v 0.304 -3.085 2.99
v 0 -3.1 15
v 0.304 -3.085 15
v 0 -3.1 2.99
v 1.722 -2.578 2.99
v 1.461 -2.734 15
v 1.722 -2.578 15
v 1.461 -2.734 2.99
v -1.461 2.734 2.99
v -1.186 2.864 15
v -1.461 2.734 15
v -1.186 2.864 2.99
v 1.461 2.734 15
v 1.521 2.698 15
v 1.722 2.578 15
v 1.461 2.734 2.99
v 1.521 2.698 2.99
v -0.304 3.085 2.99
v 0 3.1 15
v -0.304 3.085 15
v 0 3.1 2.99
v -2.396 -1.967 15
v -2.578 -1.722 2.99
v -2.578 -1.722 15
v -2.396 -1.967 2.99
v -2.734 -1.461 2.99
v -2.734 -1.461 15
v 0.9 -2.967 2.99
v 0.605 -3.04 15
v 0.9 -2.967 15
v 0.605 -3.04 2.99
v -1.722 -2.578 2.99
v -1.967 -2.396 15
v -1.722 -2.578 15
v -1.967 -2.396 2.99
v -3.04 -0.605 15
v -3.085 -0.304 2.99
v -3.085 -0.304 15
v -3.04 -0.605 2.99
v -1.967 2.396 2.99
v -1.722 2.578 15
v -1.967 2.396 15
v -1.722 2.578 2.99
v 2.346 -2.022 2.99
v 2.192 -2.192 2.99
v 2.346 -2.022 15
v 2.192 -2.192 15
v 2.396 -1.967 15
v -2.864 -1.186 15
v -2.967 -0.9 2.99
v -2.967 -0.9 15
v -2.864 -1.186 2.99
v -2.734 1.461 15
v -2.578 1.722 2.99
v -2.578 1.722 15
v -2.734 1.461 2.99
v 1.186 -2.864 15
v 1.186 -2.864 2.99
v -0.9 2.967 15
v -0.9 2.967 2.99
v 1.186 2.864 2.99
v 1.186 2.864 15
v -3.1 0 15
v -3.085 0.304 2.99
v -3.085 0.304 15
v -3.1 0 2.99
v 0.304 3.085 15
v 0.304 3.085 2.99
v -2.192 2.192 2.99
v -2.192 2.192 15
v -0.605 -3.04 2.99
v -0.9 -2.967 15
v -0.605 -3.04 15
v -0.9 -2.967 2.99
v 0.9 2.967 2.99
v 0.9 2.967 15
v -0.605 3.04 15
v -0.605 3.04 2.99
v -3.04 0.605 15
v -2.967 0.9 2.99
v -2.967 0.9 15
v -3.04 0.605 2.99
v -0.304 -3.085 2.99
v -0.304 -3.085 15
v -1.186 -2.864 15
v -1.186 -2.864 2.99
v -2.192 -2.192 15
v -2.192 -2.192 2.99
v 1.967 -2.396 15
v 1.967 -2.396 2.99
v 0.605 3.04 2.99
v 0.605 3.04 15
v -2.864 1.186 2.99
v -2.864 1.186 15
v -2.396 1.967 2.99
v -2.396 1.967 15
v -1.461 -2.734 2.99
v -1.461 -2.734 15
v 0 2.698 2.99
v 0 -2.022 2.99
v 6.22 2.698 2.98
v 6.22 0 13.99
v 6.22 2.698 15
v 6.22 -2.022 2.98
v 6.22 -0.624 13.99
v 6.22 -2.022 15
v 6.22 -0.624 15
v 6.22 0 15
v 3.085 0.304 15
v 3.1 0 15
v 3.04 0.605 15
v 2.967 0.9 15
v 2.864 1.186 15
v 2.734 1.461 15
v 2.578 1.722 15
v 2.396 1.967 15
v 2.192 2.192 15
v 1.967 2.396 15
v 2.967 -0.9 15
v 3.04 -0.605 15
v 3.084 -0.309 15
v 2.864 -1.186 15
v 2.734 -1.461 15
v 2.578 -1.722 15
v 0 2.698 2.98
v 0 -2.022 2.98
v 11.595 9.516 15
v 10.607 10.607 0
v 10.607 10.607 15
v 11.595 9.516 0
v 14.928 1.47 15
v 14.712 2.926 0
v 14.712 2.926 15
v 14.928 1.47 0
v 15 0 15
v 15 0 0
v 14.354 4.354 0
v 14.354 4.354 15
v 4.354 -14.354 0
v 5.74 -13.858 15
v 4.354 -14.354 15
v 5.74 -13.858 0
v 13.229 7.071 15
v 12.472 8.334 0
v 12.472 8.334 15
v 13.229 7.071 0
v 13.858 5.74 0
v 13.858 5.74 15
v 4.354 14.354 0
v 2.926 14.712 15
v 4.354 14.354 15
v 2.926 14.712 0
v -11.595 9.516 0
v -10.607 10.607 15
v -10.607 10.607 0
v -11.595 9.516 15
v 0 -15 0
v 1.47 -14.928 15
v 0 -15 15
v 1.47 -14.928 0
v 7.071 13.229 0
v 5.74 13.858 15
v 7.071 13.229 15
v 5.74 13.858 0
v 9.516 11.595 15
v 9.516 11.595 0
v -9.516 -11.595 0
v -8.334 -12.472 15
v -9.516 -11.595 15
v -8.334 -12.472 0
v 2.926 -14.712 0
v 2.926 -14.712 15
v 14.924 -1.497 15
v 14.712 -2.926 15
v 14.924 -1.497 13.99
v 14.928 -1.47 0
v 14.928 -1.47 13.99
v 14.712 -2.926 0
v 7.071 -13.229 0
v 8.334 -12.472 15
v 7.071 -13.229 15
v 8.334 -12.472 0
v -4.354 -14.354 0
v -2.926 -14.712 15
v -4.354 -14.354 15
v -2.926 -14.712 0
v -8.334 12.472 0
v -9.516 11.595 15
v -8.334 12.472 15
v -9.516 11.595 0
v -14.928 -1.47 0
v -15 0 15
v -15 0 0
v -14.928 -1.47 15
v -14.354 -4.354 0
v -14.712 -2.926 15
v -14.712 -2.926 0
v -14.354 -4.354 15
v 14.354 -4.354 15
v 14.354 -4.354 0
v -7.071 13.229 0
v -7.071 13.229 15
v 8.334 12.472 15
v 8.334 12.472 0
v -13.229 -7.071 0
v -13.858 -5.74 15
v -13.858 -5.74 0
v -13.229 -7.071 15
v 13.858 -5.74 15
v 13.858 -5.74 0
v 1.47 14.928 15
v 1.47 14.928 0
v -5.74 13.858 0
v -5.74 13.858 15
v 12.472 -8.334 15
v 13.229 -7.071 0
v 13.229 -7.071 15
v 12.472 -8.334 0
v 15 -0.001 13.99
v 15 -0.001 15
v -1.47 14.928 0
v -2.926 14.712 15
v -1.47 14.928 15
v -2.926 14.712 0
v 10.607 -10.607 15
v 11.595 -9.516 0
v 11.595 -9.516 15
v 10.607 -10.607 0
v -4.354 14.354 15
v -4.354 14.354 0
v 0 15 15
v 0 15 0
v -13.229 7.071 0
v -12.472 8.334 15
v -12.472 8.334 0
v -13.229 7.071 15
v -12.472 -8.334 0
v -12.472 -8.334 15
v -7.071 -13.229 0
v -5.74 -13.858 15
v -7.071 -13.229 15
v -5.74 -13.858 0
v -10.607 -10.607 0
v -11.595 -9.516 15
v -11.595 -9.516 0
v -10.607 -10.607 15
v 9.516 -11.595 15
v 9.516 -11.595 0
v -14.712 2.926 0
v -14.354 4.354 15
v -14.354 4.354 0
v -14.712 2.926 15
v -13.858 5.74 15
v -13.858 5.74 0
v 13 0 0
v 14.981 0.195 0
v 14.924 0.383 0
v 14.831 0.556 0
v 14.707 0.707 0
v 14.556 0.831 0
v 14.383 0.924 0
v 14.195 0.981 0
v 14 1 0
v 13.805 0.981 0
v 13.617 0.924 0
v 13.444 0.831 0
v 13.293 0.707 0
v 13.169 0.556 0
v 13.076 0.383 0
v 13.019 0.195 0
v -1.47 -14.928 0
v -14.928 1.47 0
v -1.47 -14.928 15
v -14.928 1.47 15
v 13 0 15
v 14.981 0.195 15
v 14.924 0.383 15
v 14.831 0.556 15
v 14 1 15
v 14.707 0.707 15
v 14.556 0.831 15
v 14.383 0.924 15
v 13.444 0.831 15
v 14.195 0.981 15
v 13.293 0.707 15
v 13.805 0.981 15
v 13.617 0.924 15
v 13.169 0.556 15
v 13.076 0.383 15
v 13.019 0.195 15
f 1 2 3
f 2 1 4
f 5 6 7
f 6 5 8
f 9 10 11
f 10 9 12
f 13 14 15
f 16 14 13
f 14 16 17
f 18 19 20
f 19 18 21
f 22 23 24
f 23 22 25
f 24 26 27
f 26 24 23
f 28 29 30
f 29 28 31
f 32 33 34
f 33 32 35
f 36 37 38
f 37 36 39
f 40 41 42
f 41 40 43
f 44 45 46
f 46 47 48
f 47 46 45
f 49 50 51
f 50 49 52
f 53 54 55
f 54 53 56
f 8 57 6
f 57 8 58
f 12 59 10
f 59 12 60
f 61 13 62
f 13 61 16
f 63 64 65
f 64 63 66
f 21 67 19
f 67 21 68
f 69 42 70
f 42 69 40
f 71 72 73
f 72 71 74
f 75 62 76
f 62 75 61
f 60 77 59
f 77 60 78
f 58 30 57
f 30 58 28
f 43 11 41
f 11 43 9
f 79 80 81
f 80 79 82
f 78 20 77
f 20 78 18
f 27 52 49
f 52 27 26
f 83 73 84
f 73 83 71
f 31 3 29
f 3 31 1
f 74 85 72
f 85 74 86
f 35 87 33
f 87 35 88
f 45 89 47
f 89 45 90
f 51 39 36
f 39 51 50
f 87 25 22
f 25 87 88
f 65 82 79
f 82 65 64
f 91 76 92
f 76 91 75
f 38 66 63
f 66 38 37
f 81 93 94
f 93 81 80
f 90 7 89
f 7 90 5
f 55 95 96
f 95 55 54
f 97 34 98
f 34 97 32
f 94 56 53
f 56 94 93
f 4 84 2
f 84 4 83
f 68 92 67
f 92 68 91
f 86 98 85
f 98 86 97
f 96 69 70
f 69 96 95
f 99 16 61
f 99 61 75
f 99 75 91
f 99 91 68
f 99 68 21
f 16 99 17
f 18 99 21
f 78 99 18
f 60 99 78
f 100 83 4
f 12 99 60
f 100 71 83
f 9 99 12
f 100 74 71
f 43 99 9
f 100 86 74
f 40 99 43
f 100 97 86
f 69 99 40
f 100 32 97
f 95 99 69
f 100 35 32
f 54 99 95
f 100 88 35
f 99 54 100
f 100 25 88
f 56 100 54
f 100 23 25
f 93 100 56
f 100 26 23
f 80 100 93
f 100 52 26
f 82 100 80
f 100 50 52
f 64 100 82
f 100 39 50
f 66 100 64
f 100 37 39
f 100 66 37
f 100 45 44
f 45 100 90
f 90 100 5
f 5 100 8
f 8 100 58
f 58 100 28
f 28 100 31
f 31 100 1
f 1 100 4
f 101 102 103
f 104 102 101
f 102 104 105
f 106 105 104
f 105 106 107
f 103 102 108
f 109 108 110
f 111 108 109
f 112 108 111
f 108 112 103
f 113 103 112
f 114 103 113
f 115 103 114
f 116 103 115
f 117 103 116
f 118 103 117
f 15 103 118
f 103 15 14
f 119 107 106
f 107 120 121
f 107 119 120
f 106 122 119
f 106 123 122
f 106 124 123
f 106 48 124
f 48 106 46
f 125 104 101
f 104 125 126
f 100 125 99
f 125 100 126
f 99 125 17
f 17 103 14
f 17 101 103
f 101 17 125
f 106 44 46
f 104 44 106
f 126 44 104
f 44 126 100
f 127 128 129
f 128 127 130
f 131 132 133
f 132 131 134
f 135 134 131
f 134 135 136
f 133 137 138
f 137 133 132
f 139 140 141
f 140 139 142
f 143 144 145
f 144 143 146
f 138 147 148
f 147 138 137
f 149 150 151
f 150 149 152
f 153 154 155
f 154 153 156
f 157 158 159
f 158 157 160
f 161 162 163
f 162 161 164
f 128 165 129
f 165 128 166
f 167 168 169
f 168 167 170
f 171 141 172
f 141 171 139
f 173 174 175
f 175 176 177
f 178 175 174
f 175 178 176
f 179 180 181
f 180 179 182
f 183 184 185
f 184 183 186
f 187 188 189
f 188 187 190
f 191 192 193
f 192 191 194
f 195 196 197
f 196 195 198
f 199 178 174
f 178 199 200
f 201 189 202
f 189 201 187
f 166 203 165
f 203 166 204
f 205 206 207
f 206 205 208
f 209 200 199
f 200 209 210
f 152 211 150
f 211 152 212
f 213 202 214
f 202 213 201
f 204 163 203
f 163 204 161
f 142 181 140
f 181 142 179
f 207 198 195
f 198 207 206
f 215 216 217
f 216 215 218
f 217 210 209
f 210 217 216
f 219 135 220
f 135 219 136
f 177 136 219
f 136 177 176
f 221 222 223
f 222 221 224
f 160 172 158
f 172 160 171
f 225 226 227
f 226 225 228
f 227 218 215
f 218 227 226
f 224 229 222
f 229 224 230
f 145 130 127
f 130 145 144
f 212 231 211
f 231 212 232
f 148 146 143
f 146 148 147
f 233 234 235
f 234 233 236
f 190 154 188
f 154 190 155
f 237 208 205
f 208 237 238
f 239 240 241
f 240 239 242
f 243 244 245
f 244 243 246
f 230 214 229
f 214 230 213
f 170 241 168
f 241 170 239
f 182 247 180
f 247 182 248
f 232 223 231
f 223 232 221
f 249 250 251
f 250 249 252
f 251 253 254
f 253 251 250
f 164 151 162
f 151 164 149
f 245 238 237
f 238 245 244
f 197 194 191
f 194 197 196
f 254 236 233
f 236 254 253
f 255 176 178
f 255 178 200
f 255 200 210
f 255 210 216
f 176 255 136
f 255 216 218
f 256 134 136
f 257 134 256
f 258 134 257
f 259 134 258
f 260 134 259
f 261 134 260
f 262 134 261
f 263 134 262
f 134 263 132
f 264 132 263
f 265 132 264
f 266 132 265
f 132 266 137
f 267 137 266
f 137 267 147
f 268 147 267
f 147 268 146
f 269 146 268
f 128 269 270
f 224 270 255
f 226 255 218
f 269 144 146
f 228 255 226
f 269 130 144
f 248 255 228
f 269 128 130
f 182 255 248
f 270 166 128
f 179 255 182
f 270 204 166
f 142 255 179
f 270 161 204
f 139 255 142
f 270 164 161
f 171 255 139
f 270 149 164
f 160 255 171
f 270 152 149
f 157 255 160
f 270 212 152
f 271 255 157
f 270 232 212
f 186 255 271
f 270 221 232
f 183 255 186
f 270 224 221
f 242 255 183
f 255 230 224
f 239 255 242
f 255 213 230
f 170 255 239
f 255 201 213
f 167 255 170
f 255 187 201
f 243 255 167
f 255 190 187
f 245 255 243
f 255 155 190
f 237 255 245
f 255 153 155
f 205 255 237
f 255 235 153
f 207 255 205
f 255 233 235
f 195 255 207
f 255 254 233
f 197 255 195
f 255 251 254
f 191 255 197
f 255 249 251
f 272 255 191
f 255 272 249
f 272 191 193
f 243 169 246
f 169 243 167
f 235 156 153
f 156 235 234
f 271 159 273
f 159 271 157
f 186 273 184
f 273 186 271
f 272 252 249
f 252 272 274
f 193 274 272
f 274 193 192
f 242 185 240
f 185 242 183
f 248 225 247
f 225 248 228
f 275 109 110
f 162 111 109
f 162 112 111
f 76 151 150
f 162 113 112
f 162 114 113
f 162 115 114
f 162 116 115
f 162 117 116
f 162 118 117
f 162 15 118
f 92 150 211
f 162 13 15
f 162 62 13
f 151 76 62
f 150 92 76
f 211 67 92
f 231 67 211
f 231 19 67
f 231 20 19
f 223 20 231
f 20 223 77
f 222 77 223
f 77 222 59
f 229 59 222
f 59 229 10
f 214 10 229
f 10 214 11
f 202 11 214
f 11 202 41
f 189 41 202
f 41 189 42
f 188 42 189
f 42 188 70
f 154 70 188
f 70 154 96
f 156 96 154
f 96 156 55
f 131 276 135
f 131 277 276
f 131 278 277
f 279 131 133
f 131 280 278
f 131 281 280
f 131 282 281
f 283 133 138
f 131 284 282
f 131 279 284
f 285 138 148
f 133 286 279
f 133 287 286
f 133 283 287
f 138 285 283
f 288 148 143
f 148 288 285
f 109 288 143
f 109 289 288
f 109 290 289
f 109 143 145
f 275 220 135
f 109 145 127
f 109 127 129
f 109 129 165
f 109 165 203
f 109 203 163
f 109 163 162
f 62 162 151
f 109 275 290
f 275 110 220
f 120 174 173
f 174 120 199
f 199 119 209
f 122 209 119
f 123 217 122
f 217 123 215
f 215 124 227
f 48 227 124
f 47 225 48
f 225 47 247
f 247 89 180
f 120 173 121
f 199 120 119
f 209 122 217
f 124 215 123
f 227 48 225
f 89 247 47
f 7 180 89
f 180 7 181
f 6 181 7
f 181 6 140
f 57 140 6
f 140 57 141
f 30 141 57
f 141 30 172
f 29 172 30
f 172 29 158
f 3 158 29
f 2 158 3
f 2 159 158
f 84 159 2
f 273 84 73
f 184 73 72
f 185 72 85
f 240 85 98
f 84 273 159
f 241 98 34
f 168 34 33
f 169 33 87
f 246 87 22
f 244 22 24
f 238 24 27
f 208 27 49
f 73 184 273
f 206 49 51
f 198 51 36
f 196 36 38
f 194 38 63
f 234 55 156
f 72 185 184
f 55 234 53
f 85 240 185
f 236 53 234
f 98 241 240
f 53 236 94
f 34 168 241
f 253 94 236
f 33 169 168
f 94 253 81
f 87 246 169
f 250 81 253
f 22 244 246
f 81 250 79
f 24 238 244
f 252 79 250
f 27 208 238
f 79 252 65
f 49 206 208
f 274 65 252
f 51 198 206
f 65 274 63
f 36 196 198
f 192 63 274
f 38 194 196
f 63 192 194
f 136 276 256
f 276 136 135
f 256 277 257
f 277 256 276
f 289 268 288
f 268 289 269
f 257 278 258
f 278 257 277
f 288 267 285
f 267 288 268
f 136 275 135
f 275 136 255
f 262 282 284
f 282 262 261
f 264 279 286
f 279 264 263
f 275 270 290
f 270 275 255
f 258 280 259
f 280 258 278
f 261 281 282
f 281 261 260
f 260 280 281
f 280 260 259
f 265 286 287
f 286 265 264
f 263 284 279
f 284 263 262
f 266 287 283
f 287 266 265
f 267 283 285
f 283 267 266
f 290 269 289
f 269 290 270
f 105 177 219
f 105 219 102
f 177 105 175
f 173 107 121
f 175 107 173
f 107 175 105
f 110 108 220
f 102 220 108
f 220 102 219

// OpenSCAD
// Replacement knob for hotplate stirrer with 6 mm D-shaft
// Dimensions
d_shaft = 6.0;           // shaft diameter (mm)
d_knob = 30.0;           // knob outer diameter (mm)
h_knob = 15.0;           // knob total height (mm)
h_bore = 12.0;           // depth of D-bore (mm)
d_bore = 6.2;            // bore circle diameter (mm)
flat_to_flat = 4.7;      // distance from flat side to opposite side of D-bore (mm)
groove_d = 2.0;          // groove diameter (half-cylinder) (mm)
n_grooves = 18;          // number of grip grooves
pointer_width = 1.5;     // pointer groove width (mm)
pointer_depth = 1.0;     // pointer groove depth (mm)

// Geometry calculations
r_knob = d_knob / 2;
r_bore = d_bore / 2;
// Distance from center to flat side of D-bore
h_flat = sqrt(r_bore^2 - (flat_to_flat/2)^2);
// Height of D-bore flat from center (negative because flat is at bottom)
y_flat = -h_flat;

// Set resolution for curves
$fn = 64;

module knob() {
    // Main cylinder
    cylinder(h = h_knob, r = r_knob, center = false);
}

module d_bore() {
    // D-shaped blind bore: cylinder with flat cut on one side
    translate([0, 0, -0.01]) {
        // Full cylinder
        cylinder(h = h_bore + 0.02, r = r_bore, center = false);
        
        // Cut flat side: extrude a rectangle to remove material
        // The flat is at y = -h_flat, and extends across the diameter
        translate([0, y_flat, -0.01]) {
            cube([d_bore + 0.02, flat_to_flat + 0.02, h_bore + 0.02]);
        }
    }
}

module grip_grooves() {
    r_groove = groove_d / 2;
    // Create semicircular groove profile (outer half-cylinder)
    // The groove is centered at r = r_knob - r_groove, and extends radially outward
    // We'll use rotate_extrude with a semicircle pointing outward
    
    // Define the semicircle profile in the r-z plane (r as x-axis, z as y-axis)
    // The semicircle has radius r_groove, centered at (r_knob - r_groove, 0)
    // We want the outer half (pointing away from center), so we'll use angles -90 to 90 degrees
    
    // Create the semicircular groove
    translate([r_knob - r_groove, 0, -0.01]) {
        rotate_extrude(angle = 180, $fn = 32) {
            // Semicircle pointing outward: use a rectangle that will be rotated to make a hollow cylinder
            // But we need a semicircle, so use a polygon
            polygon(points = [
                [0, 0],
                [r_groove, 0],
                [r_groove, h_knob + 0.02],
                [0, h_knob + 0.02]
            ]);
        }
    }
}

module pointer_groove() {
    // Pointer groove: from center to outer edge, 1.5mm wide, 1mm deep
    // On the same side as the flat of the D (negative y side, where the flat is)
    // Width is along the circumference, so we need a wedge-shaped groove
    
    // Calculate the angle for the pointer groove
    // The groove is 1.5mm wide at the outer edge (radius = r_knob)
    // Angle = width / radius (in radians)
    pointer_angle = (pointer_width / r_knob) * (180 / PI);
    
    // The pointer groove should be on the same side as the D-flat (negative y side)
    // So we rotate to align with negative y-axis (180 degrees from positive y)
    rotate([0, 0, -pointer_angle/2 + 180]) {
        linear_extrude(height = pointer_depth + 0.01, center = false, convexity = 10) {
            // Triangle from center to outer edge
            polygon(points = [
                [0, 0],
                [r_knob, -pointer_width/2],
                [r_knob, pointer_width/2]
            ]);
        }
    }
}

module knob_with_features() {
    difference() {
        knob();
        
        // D-shaped bore
        translate([0, 0, h_knob - h_bore]) {
            d_bore();
        }
        
        // Grip grooves
        // Use rotate_extrude approach for grip grooves
        // Create the semicircular groove profile and rotate it
        r_groove = groove_d / 2;
        
        // Create the groove profile as a semicircle pointing outward
        // We'll do this by creating a full cylinder and subtracting the inner half
        // But rotate_extrude is cleaner
        
        // Define the semicircle profile in the r-z plane
        // The profile is a semicircle of radius r_groove, centered at (r_knob - r_groove, 0)
        // We want the outer half, so we'll use angles -90 to 90 degrees
        
        // Create the semicircular groove
        translate([r_knob - r_groove, 0, -0.01]) {
            rotate_extrude(angle = 180, $fn = 32) {
                // Semicircle pointing outward: use a rectangle that will be rotated to make a hollow cylinder
                // But we need a semicircle, so use a polygon
                polygon(points = [
                    [0, 0],
                    [r_groove, 0],
                    [r_groove, h_knob + 0.02],
                    [0, h_knob + 0.02]
                ]);
            }
        }
        
        // Pointer groove
        translate([0, 0, h_knob - pointer_depth - 0.01]) {
            rotate([0, 0, 180]) {  // Align with D-flat side (negative y-axis)
                pointer_groove();
            }
        }
    }
}

// Build the final knob
knob_with_features();
